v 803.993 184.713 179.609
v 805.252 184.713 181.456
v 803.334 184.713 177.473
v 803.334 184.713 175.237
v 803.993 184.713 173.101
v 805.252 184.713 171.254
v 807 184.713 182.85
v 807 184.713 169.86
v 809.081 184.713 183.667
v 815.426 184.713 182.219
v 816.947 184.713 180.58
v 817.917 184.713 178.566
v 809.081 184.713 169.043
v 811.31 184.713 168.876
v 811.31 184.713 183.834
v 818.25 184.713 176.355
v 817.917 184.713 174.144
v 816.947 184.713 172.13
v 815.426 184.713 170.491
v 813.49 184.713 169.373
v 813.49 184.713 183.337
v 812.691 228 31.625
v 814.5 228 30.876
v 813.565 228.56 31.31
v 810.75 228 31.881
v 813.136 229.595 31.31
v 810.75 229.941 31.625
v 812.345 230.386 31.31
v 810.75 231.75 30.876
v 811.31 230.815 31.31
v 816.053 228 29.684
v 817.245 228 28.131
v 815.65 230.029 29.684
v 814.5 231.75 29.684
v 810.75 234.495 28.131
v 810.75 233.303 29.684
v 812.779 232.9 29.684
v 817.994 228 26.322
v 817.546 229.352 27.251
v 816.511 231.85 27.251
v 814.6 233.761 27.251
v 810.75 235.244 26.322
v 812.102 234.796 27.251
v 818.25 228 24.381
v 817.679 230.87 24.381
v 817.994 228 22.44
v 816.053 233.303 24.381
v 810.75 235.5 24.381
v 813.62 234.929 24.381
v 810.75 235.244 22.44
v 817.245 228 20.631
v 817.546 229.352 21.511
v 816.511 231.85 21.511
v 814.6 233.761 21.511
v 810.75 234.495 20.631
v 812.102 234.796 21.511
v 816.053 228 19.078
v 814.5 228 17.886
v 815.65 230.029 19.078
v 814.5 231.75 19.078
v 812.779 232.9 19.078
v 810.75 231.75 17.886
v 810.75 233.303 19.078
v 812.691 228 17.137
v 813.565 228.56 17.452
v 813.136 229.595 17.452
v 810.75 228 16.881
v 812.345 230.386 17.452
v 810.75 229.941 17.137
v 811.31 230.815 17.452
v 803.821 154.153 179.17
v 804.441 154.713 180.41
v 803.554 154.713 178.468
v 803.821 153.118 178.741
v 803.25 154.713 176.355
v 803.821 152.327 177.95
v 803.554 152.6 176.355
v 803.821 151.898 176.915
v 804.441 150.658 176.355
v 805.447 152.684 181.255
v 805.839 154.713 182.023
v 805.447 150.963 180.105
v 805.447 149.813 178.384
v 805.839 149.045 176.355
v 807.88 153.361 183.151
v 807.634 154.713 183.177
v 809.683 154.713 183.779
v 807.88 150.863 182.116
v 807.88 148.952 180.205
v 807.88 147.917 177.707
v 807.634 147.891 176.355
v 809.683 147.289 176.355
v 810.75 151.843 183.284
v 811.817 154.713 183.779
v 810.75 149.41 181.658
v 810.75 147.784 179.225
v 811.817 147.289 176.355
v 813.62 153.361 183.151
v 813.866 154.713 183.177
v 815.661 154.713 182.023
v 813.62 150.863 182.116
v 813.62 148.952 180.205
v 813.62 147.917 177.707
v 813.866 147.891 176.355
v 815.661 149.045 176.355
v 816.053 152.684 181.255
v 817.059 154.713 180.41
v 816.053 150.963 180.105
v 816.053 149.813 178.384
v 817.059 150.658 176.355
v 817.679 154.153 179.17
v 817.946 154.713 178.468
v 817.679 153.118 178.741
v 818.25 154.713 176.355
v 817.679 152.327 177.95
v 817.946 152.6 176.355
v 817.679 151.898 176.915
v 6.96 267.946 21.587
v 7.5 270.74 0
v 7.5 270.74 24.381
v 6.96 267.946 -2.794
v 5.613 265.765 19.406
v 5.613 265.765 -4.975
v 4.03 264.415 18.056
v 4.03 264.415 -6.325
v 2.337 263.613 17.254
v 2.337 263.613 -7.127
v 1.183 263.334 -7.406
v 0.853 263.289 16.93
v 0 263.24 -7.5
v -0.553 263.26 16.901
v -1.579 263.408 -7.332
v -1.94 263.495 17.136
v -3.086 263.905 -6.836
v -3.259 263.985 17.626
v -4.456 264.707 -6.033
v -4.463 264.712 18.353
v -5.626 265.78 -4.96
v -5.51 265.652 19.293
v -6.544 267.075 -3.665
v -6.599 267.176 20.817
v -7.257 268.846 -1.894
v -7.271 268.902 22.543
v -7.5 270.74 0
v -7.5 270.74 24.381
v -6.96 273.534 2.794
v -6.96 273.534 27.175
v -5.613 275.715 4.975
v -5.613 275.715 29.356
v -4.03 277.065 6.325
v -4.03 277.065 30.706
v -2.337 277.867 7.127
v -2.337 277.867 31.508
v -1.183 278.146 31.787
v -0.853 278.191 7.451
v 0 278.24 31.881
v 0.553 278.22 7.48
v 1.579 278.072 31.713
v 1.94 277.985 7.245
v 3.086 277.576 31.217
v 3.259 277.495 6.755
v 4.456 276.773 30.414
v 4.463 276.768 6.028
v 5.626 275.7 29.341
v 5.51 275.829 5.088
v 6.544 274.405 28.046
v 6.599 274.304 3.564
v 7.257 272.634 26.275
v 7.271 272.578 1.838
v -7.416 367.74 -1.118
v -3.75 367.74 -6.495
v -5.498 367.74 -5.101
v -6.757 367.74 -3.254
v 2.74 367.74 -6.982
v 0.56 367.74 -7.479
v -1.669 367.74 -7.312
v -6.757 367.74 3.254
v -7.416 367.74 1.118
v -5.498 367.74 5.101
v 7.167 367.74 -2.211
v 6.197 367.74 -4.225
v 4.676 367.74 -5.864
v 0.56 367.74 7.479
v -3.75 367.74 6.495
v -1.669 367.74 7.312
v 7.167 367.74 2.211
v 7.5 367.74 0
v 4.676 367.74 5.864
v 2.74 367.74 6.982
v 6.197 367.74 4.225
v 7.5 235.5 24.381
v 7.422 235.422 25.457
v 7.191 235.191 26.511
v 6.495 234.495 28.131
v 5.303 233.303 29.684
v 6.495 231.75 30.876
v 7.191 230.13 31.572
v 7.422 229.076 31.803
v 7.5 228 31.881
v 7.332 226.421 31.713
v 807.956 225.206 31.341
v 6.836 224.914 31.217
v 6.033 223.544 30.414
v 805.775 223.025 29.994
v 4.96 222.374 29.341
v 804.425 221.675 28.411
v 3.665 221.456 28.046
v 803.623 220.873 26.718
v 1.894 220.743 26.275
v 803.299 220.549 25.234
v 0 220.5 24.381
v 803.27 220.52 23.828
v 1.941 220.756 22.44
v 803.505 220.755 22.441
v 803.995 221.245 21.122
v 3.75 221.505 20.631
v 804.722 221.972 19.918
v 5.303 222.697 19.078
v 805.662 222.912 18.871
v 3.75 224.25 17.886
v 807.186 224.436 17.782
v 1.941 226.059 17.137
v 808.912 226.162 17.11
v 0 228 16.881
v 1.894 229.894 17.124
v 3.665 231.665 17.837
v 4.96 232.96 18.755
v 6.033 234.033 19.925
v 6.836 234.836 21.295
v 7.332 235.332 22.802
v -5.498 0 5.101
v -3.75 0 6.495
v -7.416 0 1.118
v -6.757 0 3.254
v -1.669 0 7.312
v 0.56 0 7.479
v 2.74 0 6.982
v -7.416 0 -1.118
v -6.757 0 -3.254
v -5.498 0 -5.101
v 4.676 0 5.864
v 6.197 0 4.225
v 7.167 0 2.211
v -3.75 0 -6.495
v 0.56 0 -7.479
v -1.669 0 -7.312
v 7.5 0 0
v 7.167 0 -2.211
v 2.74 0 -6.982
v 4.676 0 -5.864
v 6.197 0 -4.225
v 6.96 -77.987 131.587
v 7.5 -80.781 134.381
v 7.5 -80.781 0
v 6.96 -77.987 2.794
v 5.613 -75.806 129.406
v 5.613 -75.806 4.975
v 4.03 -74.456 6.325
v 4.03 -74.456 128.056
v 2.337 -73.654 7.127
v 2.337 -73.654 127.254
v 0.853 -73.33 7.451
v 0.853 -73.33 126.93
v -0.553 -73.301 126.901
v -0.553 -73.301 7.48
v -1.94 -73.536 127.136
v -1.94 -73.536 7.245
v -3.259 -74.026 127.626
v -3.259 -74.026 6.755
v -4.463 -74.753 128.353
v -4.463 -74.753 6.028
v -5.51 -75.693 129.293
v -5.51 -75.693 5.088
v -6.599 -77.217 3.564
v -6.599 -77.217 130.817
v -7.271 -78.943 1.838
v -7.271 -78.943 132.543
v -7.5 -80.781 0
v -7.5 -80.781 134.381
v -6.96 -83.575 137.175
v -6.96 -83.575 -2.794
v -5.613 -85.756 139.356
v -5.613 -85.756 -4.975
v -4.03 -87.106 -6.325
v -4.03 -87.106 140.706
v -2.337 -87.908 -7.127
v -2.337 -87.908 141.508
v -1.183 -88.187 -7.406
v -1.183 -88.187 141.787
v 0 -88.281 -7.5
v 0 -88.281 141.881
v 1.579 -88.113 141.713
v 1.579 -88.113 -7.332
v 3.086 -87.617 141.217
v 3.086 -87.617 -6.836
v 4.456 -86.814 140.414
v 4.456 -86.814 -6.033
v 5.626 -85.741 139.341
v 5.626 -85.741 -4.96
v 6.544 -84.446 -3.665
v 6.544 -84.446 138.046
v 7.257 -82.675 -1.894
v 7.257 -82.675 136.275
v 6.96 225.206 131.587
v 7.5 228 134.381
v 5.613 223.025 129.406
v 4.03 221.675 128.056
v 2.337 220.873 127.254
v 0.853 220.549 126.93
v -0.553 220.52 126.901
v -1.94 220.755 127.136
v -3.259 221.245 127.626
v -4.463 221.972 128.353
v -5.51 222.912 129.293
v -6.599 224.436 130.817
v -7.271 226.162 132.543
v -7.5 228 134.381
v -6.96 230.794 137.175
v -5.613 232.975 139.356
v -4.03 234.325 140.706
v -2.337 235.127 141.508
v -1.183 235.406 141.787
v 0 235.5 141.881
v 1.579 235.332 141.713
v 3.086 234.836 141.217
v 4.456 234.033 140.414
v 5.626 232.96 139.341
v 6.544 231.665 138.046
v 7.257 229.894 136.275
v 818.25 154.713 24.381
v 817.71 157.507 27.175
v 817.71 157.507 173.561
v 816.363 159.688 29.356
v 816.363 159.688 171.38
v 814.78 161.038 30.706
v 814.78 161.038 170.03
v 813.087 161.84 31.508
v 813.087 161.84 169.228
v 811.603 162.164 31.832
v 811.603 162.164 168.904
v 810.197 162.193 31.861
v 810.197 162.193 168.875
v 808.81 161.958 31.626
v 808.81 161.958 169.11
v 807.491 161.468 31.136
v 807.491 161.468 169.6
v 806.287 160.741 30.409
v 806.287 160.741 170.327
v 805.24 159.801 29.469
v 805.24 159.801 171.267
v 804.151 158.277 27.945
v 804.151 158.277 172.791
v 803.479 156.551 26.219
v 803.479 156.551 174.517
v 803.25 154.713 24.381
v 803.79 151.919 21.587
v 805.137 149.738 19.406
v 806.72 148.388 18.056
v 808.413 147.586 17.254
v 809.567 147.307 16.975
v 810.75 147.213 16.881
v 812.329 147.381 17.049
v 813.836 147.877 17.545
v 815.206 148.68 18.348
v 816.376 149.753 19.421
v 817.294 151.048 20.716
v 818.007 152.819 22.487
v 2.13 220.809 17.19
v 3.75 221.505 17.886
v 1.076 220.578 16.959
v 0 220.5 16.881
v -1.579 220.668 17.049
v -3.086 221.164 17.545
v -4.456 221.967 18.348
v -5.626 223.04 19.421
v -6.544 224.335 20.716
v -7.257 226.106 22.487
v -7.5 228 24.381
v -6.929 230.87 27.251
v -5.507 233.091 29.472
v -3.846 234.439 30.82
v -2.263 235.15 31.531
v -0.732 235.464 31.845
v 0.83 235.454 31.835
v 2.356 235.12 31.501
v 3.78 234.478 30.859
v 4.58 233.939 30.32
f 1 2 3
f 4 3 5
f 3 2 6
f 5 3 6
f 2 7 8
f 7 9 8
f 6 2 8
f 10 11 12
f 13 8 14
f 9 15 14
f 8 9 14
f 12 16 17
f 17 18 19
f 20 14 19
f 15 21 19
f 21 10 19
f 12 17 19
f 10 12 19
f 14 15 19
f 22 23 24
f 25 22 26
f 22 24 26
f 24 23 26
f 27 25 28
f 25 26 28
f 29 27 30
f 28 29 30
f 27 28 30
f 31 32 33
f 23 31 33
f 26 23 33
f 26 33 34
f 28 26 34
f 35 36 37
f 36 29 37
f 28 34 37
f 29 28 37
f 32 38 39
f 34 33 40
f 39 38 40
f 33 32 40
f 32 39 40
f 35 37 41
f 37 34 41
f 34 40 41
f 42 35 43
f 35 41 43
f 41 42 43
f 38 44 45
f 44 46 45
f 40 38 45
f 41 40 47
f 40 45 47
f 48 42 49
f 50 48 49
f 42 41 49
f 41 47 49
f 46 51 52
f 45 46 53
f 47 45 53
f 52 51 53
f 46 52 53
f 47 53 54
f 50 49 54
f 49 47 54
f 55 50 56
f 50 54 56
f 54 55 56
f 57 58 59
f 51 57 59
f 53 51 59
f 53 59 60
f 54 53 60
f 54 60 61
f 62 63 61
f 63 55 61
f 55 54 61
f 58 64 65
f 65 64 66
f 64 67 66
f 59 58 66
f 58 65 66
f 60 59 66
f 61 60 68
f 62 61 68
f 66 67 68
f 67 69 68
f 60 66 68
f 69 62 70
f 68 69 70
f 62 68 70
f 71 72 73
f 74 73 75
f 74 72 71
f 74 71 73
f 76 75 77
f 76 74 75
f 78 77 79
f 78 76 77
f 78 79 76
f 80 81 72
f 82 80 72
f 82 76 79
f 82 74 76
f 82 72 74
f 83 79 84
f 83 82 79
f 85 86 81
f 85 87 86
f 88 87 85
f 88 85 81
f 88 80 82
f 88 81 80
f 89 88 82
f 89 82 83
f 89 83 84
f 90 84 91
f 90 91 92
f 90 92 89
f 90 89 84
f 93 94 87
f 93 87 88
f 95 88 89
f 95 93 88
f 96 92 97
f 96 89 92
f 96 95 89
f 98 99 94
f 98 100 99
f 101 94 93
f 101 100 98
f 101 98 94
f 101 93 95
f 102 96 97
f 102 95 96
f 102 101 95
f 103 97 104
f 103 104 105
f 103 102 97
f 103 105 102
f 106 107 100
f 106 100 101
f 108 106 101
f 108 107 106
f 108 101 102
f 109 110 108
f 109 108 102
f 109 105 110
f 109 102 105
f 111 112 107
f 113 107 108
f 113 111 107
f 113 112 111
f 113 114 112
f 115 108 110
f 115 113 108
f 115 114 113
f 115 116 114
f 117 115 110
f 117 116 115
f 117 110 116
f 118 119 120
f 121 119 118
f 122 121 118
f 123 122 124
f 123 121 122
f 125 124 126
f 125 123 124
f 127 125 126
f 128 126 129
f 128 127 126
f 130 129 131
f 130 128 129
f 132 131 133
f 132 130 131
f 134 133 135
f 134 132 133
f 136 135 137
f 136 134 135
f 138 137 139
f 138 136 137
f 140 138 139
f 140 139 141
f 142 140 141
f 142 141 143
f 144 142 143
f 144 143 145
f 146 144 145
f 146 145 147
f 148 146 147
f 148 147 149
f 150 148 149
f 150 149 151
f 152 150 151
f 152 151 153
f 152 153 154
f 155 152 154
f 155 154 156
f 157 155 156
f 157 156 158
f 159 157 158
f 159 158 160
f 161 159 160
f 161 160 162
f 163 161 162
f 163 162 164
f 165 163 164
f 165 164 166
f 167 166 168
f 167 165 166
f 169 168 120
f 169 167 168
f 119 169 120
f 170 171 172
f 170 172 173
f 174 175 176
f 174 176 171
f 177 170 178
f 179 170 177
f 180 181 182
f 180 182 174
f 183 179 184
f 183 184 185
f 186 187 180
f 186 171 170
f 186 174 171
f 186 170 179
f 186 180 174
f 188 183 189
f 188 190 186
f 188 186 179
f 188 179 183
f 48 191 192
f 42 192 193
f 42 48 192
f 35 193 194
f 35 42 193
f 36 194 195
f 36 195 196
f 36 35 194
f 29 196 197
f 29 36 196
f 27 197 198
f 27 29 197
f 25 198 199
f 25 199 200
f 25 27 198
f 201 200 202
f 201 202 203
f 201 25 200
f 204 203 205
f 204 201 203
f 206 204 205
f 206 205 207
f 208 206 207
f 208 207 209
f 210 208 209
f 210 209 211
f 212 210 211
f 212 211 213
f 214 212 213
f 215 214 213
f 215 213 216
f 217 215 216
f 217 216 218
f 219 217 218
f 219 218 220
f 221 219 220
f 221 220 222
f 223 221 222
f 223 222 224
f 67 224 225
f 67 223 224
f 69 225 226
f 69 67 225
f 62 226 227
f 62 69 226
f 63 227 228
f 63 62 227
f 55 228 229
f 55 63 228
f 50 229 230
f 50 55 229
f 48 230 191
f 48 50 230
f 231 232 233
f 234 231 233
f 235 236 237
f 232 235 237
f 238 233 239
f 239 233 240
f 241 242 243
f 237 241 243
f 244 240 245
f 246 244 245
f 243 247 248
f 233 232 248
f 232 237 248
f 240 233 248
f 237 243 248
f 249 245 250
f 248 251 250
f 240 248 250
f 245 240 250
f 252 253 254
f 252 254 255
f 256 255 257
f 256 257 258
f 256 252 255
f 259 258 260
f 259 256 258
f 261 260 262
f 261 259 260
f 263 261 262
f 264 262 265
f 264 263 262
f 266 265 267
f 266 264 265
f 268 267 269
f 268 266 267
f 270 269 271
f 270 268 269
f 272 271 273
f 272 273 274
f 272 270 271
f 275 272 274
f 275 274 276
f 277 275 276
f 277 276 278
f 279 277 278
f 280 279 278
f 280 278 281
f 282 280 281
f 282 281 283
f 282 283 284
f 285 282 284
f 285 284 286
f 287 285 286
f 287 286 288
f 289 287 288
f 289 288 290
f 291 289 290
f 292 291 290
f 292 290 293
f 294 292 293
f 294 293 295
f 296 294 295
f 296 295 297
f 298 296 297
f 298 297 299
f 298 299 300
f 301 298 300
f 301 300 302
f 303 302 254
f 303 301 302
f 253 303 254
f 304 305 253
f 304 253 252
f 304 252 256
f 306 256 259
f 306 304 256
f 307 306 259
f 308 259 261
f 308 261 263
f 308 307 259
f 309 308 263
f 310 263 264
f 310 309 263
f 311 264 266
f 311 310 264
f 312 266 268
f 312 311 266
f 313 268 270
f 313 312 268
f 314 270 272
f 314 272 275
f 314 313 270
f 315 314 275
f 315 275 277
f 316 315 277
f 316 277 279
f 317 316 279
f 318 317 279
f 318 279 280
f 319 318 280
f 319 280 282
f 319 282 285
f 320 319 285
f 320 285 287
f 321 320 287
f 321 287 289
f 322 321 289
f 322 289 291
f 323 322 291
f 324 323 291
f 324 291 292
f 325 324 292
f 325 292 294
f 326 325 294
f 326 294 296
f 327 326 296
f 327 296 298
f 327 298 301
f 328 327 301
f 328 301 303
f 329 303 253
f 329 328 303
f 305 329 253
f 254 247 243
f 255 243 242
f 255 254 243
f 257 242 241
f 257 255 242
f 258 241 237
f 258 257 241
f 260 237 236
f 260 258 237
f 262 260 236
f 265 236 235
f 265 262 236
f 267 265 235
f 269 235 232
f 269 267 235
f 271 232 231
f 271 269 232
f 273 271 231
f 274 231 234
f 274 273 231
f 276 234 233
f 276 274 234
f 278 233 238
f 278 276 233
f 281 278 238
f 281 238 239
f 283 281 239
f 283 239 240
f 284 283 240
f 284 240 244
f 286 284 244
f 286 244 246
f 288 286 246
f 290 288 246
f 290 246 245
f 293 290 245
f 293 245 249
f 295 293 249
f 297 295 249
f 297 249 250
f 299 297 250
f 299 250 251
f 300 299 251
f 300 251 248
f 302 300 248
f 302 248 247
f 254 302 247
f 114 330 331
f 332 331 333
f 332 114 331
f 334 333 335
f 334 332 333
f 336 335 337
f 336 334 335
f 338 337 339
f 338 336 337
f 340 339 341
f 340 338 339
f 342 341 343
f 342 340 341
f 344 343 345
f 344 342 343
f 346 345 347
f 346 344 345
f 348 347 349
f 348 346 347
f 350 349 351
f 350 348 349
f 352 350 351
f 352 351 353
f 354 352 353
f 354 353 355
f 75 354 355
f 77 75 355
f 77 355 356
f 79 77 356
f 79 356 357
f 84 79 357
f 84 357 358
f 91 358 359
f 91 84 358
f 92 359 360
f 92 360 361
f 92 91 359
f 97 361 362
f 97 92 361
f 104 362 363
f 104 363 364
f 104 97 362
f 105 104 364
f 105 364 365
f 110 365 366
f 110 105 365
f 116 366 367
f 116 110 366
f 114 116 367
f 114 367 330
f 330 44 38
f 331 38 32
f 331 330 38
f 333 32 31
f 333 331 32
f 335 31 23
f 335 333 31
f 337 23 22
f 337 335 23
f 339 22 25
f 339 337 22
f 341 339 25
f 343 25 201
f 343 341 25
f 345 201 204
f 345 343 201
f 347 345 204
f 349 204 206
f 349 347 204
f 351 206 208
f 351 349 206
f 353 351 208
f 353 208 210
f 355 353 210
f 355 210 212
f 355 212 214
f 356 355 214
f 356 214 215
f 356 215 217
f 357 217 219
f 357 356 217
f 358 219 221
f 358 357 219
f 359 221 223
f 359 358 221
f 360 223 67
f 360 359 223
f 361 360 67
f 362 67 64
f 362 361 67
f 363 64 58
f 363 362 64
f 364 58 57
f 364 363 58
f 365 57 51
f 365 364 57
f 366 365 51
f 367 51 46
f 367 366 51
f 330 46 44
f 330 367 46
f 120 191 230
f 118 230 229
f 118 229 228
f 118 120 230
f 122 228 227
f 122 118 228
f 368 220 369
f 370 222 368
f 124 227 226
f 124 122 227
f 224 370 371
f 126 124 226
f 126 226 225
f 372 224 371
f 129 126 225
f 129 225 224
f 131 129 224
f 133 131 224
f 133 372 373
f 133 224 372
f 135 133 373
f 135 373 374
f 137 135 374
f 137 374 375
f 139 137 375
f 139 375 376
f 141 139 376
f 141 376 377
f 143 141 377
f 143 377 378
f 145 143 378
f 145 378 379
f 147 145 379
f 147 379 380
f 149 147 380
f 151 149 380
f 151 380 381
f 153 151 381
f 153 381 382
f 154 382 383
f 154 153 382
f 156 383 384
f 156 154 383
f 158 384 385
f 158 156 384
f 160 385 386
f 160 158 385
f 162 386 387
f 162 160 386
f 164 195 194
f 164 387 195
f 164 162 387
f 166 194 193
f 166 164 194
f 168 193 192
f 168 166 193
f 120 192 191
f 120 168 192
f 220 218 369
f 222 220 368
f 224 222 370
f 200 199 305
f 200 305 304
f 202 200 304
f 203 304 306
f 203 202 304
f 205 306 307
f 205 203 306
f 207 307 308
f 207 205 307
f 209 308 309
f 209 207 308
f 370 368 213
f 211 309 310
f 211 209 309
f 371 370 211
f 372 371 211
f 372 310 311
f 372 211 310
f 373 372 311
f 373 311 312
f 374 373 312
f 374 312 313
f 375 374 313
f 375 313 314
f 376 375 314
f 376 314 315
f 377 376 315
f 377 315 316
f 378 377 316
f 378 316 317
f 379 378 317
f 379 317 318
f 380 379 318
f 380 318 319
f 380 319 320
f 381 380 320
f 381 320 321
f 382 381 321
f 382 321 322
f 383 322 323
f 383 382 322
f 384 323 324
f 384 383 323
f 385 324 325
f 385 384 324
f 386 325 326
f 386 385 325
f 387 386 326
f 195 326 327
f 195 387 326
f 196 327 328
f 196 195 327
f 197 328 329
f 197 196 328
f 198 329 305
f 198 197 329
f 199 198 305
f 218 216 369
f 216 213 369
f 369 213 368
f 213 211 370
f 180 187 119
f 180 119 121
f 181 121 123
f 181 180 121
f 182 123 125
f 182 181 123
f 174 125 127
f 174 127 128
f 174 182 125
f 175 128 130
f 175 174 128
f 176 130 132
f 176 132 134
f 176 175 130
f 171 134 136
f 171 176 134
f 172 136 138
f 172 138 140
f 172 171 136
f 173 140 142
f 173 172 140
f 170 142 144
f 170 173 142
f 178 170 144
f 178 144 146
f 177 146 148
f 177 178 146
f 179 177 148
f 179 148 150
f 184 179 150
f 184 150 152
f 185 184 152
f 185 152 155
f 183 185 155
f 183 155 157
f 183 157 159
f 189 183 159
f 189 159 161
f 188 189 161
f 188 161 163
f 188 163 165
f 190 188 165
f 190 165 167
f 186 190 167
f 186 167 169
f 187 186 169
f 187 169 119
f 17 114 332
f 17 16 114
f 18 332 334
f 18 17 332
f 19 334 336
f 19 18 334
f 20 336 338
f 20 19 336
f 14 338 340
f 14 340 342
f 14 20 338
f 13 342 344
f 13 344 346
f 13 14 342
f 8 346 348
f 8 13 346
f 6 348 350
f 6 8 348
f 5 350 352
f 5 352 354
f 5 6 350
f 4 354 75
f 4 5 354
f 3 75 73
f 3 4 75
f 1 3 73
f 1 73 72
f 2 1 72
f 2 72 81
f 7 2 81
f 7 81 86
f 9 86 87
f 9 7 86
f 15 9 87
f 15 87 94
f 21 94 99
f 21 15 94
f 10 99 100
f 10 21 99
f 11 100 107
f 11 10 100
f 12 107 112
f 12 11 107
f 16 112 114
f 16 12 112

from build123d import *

# Parameters (mm, degrees)
F0_R  = 7.5
F3_R  = 7.5
F7_R  = 7.5
F11_R = 7.5


with BuildPart() as f2:
    # F2: sweep along a path in F1
    with BuildLine(Plane.YZ) as f2_path:
        Line((0, 0), (-80.781, 0))
        Line((-80.781, 0), (-80.781, 134.381))
        Line((-80.781, 134.381), (228, 134.381))
        Line((228, 134.381), (228, 24.381))
        Line((228, 24.381), (270.740032196, 24.381))
        Line((270.740032196, 24.381), (270.740032196, 0))
        Line((270.740032196, 0), (367.740032196, 0))
    # F0 (on Front) → F2 (sweep)
    with BuildSketch(Plane.XZ):
        Circle(F0_R)
    sweep(path=f2_path.line, transition=Transition.RIGHT)

    # F5: sweep along a path in F4
    with BuildLine(Plane.XZ) as f5_path:
        Line((0, 0), (810.75, 0))
    # F3 (on Right) → F5 (sweep)
    with BuildSketch(Plane.YZ):
        with Locations((228, 24.381)):
            Circle(F3_R)
    sweep(path=f5_path.line)

    # F9: sweep along a path in F8
    with BuildLine(Plane.YZ) as f9_path:
        Line((228, 24.381), (154.713, 24.381))
        Line((154.713, 24.381), (154.713, 176.355))
    # F7 (on offset) → F9 (sweep)
    with BuildSketch(Plane.XZ.offset(-228)):
        with Locations((810.75, 24.381)):
            Circle(F7_R)
    sweep(path=f9_path.line, transition=Transition.RIGHT)

    # F9_face (on face) → F13 (revolve)
    with BuildSketch(Plane(origin=(813.9330988618, 228, 24.381), x_dir=(-1, 0, 0), z_dir=(0, 1, 0))):
        with BuildLine():
            ThreePointArc((-4.3169011382, 0), (-2.1202019971, -5.3033008589), (3.1830988618, -7.5))
            Line((3.1830988618, -7.5), (3.1830988618, 7.5))
            ThreePointArc((3.1830988618, 7.5), (-2.1202019971, 5.3033008589), (-4.3169011382, 0))
        make_face()
    revolve(axis=Axis((810.75, 228, 24.381), (0, 0, 1)))

    # F14: sweep along a path in F12
    with BuildLine(Plane.XY) as f14_path:
        Line((862, 154.713), (862, 184.713))
    # F11 (on offset) → F14 (sweep)
    with BuildSketch(Plane.XZ.offset(-154.713)):
        with Locations((810.75, 176.355)):
            Circle(F11_R)
    sweep(path=f14_path.line)

    # F9_face1 (on face) → F15 (revolve)
    with BuildSketch(Plane(origin=(810.75, 151.5299011382, 176.355), x_dir=(1, 0, 0), z_dir=(0, 0, 1))):
        with BuildLine():
            ThreePointArc((-7.5, 3.1830988618), (0, -4.3169011382), (7.5, 3.1830988618))
            Line((7.5, 3.1830988618), (-7.5, 3.1830988618))
        make_face()
    revolve(axis=Axis((810.75, 154.713, 176.355), (1, 0, 0)))


solid = f2.part
